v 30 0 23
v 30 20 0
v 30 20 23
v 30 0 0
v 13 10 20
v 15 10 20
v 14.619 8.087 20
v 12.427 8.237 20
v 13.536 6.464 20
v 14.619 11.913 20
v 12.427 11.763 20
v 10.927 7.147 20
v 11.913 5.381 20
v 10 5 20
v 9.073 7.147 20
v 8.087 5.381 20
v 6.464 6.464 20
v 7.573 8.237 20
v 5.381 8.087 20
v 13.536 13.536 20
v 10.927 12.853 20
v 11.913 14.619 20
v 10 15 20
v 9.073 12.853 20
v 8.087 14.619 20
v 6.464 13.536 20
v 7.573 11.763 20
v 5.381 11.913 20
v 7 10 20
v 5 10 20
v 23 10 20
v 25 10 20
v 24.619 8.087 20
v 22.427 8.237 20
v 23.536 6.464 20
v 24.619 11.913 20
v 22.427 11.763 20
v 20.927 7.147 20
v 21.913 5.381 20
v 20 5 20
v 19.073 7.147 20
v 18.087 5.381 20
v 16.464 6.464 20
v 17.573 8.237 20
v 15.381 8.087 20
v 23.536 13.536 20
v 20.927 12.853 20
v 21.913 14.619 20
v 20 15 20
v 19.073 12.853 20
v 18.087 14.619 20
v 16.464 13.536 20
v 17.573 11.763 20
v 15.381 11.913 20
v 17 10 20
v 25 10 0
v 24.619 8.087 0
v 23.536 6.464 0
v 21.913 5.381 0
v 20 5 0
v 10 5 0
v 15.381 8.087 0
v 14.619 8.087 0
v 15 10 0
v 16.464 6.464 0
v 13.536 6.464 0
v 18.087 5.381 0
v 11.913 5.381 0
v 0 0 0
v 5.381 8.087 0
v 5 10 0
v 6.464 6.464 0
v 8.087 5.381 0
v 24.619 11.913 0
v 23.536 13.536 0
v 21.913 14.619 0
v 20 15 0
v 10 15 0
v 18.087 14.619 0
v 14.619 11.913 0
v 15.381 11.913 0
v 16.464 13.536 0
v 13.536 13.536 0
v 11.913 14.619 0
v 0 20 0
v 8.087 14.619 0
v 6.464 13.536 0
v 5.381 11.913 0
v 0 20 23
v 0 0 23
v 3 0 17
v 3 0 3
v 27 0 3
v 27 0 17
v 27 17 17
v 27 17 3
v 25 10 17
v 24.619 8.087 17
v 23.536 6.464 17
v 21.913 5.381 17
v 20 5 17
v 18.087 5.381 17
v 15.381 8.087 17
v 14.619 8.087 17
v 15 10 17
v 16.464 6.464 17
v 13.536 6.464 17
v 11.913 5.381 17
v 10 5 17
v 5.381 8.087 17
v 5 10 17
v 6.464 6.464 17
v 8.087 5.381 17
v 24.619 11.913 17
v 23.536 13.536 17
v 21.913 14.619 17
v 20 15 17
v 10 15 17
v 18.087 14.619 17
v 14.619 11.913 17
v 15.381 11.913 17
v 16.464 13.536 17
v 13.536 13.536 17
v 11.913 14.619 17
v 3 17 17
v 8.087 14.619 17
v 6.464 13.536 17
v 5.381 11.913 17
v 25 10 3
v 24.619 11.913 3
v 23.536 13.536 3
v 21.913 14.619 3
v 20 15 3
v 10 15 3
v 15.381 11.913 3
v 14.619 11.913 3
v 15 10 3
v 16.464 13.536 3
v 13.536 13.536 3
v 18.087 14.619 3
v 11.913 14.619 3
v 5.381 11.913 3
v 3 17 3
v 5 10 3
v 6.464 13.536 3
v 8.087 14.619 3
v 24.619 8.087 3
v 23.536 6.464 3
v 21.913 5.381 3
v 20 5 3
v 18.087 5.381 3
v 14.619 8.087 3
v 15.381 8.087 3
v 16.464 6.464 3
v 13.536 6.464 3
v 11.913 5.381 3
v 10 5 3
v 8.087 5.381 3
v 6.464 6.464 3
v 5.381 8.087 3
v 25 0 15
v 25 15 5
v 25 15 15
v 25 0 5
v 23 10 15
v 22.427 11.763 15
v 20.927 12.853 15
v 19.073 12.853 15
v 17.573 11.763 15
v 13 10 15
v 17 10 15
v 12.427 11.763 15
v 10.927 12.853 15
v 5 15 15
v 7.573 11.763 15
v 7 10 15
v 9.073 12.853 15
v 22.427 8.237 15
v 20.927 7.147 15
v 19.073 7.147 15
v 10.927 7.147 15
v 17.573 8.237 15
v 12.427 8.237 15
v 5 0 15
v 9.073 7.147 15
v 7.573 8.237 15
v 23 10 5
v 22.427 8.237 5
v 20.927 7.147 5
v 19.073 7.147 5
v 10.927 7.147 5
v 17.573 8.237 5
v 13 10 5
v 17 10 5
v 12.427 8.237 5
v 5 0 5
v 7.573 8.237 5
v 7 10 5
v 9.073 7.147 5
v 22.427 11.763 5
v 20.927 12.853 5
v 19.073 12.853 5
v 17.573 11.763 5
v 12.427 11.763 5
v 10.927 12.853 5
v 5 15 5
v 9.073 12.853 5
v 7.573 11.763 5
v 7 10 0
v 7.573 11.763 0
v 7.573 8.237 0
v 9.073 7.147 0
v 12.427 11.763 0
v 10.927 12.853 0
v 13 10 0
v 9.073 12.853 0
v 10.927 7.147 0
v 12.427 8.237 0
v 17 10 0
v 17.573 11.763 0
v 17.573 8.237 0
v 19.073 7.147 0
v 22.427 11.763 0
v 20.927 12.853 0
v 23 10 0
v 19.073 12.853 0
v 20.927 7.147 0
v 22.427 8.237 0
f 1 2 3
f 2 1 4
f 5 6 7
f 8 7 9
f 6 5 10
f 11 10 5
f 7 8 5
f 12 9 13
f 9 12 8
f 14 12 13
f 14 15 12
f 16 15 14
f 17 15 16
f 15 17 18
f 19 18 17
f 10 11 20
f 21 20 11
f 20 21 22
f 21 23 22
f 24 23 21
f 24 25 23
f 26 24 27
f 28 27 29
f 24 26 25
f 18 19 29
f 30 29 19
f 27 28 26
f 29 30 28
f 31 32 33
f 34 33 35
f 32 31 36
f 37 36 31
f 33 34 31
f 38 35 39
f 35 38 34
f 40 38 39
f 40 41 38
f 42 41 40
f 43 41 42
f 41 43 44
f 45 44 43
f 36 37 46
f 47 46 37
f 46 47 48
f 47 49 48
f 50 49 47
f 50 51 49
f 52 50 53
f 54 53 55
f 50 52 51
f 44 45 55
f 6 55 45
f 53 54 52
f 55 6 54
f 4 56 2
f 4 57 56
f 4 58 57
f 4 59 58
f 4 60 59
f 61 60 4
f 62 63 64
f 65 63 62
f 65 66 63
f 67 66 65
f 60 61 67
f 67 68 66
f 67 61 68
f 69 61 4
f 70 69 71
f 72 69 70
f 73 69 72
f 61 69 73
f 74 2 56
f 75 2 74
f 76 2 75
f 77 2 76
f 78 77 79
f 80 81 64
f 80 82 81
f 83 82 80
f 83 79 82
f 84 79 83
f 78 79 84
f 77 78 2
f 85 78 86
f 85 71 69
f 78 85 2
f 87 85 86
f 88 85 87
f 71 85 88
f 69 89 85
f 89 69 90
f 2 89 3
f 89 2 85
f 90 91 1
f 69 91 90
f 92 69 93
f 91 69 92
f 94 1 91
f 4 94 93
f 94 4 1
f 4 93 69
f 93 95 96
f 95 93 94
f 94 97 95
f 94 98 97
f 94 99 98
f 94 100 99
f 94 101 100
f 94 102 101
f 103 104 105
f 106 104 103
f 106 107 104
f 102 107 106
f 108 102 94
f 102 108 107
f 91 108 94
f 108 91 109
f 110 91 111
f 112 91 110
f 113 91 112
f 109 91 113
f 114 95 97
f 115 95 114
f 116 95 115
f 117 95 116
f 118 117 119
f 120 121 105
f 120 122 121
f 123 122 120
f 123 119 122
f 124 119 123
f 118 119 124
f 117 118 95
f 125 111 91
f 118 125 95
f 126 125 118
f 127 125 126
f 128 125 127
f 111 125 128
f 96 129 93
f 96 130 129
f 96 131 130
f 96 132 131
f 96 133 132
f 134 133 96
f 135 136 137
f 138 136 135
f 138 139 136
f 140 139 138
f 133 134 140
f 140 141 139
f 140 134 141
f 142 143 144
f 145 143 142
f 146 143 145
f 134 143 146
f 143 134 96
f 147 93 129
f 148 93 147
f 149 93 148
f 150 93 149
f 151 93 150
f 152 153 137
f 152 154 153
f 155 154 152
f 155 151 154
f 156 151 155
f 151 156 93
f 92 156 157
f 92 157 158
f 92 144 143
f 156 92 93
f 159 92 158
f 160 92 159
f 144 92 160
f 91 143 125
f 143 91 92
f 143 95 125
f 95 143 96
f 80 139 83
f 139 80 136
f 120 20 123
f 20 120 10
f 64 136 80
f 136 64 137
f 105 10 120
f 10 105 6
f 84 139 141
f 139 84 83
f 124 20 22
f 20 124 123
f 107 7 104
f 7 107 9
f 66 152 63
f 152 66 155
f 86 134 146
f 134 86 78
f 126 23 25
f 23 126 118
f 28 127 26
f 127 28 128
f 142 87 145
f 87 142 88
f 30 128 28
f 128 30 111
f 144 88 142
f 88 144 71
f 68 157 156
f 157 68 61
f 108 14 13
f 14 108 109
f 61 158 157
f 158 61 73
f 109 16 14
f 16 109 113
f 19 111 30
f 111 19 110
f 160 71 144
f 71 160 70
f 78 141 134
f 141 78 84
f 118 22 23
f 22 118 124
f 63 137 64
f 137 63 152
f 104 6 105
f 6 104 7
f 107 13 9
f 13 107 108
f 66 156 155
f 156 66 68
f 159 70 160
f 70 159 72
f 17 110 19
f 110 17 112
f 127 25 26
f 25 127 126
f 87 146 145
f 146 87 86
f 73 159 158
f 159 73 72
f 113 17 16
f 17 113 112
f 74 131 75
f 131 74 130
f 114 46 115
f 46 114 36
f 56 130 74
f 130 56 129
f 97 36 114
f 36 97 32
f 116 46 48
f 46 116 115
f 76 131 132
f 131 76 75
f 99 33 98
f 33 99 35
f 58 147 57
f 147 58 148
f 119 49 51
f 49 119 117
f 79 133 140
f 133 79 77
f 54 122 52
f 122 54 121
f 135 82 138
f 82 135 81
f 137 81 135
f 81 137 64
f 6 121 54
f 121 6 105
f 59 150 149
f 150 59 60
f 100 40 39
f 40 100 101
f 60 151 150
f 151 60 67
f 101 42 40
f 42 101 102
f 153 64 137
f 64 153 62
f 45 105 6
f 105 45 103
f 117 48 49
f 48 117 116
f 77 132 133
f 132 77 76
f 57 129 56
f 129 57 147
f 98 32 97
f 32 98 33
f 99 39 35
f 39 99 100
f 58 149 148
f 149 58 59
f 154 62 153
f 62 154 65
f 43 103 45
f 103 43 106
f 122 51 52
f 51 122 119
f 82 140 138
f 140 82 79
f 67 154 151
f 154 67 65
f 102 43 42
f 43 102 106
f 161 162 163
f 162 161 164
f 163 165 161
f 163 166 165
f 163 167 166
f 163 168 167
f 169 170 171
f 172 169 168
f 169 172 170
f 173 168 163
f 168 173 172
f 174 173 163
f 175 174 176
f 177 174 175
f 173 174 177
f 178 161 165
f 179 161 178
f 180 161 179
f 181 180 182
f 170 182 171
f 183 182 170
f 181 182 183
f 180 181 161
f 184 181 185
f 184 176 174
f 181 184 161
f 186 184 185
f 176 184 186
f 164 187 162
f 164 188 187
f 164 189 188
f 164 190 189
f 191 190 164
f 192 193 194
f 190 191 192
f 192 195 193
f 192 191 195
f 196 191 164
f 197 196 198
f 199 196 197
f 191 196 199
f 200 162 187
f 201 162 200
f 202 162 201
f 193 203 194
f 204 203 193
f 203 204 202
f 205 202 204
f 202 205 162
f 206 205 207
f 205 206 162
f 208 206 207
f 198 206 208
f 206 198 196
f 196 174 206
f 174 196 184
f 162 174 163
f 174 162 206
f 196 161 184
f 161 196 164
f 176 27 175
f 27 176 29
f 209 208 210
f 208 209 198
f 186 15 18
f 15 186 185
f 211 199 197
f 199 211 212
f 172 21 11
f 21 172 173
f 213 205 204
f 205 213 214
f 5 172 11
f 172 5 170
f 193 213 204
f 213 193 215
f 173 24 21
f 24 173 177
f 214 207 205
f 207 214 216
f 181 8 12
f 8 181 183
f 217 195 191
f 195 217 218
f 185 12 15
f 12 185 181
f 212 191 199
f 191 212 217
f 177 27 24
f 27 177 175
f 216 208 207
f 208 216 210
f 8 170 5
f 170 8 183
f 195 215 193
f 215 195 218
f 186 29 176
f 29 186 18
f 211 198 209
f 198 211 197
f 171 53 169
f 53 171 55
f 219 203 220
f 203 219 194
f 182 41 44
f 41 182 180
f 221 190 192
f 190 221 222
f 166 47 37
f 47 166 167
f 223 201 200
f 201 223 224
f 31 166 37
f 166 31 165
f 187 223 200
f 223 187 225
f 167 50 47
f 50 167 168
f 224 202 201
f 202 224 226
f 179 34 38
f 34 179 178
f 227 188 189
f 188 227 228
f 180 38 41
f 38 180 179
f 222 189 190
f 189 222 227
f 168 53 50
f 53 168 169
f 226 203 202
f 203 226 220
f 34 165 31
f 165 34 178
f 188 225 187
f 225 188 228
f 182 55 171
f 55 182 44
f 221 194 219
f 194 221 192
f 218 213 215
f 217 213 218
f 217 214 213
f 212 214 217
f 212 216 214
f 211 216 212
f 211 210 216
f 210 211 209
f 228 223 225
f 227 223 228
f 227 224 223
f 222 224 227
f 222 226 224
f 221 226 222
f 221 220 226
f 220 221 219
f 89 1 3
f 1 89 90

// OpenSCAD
module female(w,h,d,t,r,s){
   difference(){
       cube([w,d,h]);
       translate([t,0,t]) cube([w-2*t,d-t, h-2*t]);
       translate([w/3,d/2,0]) cylinder(r=r+s, h=h);
       translate([w*2/3, d/2, 0]) cylinder(r=r+s, h=h);
   } 
}
module male(w,h,d,t,r,s){
    difference(){
        translate([t+s,0,t+s])cube([w-2*t-2*s,d-t-s, h-2*t-2*s]);
        translate([w/3,d/2,0]) cylinder(r=r, h=h);
        translate([w*2/3, d/2, 0]) cylinder(r=r,h=h);
    }
}

module pin(w,h,d,t, r,s){
    union(){
        translate([w/3,d/2,0]) cylinder(r=r, h=h);
        translate([w*2/3, d/2, 0]) cylinder(r=r,h=h);
        translate([0,0,h]) cube([w, d, t]);
    }
}

female(30,20,20,3, 3,2);
male(30,20,20,3, 3,2);
pin(30,20,20,3, 3,2);
